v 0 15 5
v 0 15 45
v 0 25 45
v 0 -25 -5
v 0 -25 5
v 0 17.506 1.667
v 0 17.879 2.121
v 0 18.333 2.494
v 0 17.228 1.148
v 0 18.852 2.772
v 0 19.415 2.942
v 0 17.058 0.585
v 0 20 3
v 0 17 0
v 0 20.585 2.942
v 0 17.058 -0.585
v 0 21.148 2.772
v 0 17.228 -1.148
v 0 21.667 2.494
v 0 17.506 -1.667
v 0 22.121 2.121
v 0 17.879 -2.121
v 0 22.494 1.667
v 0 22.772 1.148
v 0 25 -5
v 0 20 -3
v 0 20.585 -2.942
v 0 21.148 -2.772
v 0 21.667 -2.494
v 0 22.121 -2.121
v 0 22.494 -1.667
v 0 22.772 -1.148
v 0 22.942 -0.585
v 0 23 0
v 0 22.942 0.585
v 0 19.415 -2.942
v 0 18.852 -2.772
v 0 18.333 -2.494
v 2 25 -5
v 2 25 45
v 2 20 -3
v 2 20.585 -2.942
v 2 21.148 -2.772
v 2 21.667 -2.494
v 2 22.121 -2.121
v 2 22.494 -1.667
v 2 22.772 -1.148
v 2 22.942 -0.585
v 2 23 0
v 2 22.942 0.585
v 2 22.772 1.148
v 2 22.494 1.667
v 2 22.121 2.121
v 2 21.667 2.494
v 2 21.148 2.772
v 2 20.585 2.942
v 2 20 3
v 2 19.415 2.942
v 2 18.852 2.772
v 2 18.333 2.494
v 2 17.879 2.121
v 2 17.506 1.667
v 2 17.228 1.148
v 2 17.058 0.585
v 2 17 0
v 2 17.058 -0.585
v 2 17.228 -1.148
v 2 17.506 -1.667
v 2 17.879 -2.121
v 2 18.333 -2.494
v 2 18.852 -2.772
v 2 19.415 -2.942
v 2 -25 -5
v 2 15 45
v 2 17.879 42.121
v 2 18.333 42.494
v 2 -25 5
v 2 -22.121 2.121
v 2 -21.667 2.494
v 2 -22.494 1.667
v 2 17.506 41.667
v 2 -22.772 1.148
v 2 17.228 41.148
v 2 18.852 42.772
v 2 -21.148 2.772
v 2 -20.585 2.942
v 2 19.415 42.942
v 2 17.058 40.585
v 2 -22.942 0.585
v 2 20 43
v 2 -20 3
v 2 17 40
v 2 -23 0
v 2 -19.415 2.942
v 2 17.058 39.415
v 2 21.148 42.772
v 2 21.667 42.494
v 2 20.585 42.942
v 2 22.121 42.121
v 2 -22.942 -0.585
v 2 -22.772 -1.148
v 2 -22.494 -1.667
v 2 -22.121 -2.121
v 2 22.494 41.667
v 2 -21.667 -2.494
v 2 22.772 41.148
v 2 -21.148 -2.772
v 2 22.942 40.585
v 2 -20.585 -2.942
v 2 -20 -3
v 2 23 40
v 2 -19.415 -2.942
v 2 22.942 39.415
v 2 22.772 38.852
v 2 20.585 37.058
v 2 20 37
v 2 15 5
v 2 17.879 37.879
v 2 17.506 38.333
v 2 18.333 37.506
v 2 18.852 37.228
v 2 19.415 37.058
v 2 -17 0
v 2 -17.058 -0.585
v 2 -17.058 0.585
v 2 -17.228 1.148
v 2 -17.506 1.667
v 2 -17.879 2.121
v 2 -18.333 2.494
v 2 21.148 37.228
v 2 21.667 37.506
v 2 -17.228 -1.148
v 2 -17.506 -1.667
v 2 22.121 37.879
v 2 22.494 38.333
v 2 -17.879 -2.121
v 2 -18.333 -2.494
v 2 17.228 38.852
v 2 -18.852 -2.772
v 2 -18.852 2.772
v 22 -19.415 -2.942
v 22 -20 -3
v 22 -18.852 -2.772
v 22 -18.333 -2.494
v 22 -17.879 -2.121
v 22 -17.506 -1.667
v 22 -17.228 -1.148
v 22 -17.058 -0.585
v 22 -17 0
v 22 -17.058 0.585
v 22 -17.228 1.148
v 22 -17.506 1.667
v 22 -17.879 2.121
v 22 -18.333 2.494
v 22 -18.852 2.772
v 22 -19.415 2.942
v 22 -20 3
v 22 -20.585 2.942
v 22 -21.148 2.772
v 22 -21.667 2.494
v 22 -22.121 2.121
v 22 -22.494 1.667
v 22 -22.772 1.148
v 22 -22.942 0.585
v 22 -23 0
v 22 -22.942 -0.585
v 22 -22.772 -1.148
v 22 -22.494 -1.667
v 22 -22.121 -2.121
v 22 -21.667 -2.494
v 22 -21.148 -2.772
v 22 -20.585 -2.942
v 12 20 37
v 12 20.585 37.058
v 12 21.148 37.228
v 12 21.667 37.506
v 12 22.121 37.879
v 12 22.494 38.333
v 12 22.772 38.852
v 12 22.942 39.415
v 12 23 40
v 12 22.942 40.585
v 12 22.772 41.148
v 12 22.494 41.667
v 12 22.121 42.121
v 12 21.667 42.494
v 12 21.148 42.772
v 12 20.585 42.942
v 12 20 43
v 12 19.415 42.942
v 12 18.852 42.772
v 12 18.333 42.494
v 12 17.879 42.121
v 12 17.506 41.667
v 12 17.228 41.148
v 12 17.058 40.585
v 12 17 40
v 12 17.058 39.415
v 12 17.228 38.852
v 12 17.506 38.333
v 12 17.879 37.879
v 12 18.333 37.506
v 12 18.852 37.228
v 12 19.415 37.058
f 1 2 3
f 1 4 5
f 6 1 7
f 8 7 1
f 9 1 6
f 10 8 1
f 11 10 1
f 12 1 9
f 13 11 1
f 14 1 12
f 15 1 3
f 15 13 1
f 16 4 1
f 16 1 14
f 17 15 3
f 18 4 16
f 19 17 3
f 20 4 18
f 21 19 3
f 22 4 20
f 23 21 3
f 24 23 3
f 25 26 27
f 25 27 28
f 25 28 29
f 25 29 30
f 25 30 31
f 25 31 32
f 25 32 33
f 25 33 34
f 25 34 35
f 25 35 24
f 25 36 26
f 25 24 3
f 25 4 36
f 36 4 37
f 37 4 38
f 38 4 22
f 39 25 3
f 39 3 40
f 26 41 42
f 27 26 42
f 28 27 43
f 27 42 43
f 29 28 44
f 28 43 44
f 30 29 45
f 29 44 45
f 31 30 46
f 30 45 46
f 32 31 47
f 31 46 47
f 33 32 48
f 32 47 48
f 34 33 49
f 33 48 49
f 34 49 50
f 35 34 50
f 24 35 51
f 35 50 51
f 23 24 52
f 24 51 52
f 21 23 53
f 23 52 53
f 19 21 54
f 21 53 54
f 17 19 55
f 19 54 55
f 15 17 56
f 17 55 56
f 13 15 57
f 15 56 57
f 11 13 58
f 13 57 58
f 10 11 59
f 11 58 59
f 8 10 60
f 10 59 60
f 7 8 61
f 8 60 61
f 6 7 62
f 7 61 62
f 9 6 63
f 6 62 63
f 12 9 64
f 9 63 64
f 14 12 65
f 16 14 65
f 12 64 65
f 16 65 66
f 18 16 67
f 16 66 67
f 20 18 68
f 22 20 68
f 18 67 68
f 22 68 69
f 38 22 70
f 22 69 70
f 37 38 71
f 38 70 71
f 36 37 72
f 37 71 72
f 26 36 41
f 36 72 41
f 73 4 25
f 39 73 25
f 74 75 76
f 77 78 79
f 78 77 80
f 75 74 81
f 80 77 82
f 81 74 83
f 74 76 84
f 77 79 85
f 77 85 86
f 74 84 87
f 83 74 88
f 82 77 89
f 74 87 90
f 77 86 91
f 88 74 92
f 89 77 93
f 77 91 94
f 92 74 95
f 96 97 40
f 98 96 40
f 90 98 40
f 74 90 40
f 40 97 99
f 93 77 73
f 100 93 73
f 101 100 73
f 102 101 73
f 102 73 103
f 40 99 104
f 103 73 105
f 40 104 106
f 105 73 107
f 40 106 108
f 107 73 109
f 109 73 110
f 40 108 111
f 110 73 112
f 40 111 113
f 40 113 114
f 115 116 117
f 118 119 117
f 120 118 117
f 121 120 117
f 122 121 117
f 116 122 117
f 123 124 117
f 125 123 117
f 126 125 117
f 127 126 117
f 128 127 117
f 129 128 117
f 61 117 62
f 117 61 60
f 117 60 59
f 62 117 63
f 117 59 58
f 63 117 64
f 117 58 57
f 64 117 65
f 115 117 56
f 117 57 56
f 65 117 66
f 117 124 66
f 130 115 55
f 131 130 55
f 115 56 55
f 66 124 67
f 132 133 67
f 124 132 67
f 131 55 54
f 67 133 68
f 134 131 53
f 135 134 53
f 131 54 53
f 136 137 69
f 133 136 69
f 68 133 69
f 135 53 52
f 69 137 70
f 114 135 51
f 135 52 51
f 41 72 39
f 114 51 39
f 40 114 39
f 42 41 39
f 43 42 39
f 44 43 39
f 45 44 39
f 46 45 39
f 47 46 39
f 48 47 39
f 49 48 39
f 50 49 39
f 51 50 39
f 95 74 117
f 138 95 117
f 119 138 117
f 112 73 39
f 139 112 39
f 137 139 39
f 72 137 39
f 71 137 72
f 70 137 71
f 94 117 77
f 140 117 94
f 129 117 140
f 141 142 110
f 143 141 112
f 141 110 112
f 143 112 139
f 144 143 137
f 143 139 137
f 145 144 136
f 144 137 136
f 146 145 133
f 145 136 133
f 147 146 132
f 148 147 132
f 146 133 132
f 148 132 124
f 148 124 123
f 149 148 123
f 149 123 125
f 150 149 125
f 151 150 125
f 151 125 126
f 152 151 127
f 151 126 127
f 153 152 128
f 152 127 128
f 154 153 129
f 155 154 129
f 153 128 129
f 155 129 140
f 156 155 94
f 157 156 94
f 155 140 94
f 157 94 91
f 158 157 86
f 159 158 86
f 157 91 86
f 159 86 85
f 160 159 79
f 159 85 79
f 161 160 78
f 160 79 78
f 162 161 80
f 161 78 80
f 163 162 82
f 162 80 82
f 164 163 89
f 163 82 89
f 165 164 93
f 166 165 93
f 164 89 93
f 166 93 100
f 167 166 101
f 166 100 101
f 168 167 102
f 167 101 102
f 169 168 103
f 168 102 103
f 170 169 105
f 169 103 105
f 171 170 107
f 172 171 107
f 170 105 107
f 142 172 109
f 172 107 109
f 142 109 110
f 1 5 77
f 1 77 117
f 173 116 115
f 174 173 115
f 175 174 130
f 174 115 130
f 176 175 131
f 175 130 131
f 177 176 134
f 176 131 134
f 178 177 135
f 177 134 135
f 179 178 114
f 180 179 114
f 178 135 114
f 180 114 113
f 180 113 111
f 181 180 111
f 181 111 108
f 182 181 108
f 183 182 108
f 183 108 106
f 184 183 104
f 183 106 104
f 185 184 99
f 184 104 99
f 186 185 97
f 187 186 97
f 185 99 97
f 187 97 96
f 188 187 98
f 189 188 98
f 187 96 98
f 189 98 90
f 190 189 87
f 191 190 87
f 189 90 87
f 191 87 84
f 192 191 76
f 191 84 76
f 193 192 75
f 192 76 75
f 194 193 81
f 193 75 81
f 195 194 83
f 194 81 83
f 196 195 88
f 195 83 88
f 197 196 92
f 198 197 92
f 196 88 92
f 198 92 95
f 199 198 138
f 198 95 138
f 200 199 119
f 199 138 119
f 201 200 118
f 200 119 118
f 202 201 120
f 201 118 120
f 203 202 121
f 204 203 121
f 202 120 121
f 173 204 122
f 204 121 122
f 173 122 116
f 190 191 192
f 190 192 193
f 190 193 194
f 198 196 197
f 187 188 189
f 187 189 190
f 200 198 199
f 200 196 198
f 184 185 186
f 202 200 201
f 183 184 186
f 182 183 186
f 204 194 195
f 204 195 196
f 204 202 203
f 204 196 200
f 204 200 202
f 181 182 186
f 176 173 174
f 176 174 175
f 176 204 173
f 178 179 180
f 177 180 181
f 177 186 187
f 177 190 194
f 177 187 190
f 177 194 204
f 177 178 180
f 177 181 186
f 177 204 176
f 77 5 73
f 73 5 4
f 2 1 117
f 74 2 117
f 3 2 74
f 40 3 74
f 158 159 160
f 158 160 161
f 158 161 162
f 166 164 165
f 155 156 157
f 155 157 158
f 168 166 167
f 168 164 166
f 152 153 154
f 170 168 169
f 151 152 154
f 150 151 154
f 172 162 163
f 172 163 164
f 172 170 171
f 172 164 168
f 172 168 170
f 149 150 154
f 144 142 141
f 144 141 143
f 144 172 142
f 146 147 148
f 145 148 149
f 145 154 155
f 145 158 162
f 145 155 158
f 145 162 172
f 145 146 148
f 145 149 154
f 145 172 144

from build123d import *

# Parameters (mm, degrees)
SKETCH1_W           = 10
SKETCH1_H           = 50
BOSS_EXTRUDE1_DEPTH = 2
SKETCH2_R           = 3
CUT_EXTRUDE1_DEPTH  = 2
SKETCH3_R           = 3
BOSS_EXTRUDE2_DEPTH = 20
SKETCH4_W           = 2
SKETCH4_H           = 10
BOSS_EXTRUDE3_DEPTH = 40
SKETCH5_R           = 3
BOSS_EXTRUDE4_DEPTH = 10


with BuildPart() as part:
    # Sketch1 → Boss-Extrude1 (new body)
    with BuildSketch(Plane(origin=(0, 0, 0), x_dir=(0, 0, -1), z_dir=(1, 0, 0))):
        Rectangle(SKETCH1_W, SKETCH1_H)
    extrude(amount=BOSS_EXTRUDE1_DEPTH)

    # Sketch2 → Cut-Extrude1 (cut)
    with BuildSketch(Plane(origin=(2, 0, 0), x_dir=(0, 0, -1), z_dir=(1, 0, 0))):
        with Locations((0, 20)):
            Circle(SKETCH2_R)
    extrude(amount=-CUT_EXTRUDE1_DEPTH, mode=Mode.SUBTRACT)

    # Sketch3 → Boss-Extrude2 (add)
    with BuildSketch(Plane(origin=(2, 0, 0), x_dir=(0, 0, -1), z_dir=(1, 0, 0))):
        with Locations((0, -20)):
            Circle(SKETCH3_R)
    extrude(amount=BOSS_EXTRUDE2_DEPTH)

    # Sketch4 → Boss-Extrude3 (add)
    with BuildSketch(Plane.XY.offset(5)):
        with Locations((1, 20)):
            Rectangle(SKETCH4_W, SKETCH4_H)
    extrude(amount=BOSS_EXTRUDE3_DEPTH)

    # Sketch5 → Boss-Extrude4 (add)
    with BuildSketch(Plane(origin=(2, 0, 0), x_dir=(0, 0, -1), z_dir=(1, 0, 0))):
        with Locations((-40, 20)):
            Circle(SKETCH5_R)
    extrude(amount=BOSS_EXTRUDE4_DEPTH)


solid = part.part
